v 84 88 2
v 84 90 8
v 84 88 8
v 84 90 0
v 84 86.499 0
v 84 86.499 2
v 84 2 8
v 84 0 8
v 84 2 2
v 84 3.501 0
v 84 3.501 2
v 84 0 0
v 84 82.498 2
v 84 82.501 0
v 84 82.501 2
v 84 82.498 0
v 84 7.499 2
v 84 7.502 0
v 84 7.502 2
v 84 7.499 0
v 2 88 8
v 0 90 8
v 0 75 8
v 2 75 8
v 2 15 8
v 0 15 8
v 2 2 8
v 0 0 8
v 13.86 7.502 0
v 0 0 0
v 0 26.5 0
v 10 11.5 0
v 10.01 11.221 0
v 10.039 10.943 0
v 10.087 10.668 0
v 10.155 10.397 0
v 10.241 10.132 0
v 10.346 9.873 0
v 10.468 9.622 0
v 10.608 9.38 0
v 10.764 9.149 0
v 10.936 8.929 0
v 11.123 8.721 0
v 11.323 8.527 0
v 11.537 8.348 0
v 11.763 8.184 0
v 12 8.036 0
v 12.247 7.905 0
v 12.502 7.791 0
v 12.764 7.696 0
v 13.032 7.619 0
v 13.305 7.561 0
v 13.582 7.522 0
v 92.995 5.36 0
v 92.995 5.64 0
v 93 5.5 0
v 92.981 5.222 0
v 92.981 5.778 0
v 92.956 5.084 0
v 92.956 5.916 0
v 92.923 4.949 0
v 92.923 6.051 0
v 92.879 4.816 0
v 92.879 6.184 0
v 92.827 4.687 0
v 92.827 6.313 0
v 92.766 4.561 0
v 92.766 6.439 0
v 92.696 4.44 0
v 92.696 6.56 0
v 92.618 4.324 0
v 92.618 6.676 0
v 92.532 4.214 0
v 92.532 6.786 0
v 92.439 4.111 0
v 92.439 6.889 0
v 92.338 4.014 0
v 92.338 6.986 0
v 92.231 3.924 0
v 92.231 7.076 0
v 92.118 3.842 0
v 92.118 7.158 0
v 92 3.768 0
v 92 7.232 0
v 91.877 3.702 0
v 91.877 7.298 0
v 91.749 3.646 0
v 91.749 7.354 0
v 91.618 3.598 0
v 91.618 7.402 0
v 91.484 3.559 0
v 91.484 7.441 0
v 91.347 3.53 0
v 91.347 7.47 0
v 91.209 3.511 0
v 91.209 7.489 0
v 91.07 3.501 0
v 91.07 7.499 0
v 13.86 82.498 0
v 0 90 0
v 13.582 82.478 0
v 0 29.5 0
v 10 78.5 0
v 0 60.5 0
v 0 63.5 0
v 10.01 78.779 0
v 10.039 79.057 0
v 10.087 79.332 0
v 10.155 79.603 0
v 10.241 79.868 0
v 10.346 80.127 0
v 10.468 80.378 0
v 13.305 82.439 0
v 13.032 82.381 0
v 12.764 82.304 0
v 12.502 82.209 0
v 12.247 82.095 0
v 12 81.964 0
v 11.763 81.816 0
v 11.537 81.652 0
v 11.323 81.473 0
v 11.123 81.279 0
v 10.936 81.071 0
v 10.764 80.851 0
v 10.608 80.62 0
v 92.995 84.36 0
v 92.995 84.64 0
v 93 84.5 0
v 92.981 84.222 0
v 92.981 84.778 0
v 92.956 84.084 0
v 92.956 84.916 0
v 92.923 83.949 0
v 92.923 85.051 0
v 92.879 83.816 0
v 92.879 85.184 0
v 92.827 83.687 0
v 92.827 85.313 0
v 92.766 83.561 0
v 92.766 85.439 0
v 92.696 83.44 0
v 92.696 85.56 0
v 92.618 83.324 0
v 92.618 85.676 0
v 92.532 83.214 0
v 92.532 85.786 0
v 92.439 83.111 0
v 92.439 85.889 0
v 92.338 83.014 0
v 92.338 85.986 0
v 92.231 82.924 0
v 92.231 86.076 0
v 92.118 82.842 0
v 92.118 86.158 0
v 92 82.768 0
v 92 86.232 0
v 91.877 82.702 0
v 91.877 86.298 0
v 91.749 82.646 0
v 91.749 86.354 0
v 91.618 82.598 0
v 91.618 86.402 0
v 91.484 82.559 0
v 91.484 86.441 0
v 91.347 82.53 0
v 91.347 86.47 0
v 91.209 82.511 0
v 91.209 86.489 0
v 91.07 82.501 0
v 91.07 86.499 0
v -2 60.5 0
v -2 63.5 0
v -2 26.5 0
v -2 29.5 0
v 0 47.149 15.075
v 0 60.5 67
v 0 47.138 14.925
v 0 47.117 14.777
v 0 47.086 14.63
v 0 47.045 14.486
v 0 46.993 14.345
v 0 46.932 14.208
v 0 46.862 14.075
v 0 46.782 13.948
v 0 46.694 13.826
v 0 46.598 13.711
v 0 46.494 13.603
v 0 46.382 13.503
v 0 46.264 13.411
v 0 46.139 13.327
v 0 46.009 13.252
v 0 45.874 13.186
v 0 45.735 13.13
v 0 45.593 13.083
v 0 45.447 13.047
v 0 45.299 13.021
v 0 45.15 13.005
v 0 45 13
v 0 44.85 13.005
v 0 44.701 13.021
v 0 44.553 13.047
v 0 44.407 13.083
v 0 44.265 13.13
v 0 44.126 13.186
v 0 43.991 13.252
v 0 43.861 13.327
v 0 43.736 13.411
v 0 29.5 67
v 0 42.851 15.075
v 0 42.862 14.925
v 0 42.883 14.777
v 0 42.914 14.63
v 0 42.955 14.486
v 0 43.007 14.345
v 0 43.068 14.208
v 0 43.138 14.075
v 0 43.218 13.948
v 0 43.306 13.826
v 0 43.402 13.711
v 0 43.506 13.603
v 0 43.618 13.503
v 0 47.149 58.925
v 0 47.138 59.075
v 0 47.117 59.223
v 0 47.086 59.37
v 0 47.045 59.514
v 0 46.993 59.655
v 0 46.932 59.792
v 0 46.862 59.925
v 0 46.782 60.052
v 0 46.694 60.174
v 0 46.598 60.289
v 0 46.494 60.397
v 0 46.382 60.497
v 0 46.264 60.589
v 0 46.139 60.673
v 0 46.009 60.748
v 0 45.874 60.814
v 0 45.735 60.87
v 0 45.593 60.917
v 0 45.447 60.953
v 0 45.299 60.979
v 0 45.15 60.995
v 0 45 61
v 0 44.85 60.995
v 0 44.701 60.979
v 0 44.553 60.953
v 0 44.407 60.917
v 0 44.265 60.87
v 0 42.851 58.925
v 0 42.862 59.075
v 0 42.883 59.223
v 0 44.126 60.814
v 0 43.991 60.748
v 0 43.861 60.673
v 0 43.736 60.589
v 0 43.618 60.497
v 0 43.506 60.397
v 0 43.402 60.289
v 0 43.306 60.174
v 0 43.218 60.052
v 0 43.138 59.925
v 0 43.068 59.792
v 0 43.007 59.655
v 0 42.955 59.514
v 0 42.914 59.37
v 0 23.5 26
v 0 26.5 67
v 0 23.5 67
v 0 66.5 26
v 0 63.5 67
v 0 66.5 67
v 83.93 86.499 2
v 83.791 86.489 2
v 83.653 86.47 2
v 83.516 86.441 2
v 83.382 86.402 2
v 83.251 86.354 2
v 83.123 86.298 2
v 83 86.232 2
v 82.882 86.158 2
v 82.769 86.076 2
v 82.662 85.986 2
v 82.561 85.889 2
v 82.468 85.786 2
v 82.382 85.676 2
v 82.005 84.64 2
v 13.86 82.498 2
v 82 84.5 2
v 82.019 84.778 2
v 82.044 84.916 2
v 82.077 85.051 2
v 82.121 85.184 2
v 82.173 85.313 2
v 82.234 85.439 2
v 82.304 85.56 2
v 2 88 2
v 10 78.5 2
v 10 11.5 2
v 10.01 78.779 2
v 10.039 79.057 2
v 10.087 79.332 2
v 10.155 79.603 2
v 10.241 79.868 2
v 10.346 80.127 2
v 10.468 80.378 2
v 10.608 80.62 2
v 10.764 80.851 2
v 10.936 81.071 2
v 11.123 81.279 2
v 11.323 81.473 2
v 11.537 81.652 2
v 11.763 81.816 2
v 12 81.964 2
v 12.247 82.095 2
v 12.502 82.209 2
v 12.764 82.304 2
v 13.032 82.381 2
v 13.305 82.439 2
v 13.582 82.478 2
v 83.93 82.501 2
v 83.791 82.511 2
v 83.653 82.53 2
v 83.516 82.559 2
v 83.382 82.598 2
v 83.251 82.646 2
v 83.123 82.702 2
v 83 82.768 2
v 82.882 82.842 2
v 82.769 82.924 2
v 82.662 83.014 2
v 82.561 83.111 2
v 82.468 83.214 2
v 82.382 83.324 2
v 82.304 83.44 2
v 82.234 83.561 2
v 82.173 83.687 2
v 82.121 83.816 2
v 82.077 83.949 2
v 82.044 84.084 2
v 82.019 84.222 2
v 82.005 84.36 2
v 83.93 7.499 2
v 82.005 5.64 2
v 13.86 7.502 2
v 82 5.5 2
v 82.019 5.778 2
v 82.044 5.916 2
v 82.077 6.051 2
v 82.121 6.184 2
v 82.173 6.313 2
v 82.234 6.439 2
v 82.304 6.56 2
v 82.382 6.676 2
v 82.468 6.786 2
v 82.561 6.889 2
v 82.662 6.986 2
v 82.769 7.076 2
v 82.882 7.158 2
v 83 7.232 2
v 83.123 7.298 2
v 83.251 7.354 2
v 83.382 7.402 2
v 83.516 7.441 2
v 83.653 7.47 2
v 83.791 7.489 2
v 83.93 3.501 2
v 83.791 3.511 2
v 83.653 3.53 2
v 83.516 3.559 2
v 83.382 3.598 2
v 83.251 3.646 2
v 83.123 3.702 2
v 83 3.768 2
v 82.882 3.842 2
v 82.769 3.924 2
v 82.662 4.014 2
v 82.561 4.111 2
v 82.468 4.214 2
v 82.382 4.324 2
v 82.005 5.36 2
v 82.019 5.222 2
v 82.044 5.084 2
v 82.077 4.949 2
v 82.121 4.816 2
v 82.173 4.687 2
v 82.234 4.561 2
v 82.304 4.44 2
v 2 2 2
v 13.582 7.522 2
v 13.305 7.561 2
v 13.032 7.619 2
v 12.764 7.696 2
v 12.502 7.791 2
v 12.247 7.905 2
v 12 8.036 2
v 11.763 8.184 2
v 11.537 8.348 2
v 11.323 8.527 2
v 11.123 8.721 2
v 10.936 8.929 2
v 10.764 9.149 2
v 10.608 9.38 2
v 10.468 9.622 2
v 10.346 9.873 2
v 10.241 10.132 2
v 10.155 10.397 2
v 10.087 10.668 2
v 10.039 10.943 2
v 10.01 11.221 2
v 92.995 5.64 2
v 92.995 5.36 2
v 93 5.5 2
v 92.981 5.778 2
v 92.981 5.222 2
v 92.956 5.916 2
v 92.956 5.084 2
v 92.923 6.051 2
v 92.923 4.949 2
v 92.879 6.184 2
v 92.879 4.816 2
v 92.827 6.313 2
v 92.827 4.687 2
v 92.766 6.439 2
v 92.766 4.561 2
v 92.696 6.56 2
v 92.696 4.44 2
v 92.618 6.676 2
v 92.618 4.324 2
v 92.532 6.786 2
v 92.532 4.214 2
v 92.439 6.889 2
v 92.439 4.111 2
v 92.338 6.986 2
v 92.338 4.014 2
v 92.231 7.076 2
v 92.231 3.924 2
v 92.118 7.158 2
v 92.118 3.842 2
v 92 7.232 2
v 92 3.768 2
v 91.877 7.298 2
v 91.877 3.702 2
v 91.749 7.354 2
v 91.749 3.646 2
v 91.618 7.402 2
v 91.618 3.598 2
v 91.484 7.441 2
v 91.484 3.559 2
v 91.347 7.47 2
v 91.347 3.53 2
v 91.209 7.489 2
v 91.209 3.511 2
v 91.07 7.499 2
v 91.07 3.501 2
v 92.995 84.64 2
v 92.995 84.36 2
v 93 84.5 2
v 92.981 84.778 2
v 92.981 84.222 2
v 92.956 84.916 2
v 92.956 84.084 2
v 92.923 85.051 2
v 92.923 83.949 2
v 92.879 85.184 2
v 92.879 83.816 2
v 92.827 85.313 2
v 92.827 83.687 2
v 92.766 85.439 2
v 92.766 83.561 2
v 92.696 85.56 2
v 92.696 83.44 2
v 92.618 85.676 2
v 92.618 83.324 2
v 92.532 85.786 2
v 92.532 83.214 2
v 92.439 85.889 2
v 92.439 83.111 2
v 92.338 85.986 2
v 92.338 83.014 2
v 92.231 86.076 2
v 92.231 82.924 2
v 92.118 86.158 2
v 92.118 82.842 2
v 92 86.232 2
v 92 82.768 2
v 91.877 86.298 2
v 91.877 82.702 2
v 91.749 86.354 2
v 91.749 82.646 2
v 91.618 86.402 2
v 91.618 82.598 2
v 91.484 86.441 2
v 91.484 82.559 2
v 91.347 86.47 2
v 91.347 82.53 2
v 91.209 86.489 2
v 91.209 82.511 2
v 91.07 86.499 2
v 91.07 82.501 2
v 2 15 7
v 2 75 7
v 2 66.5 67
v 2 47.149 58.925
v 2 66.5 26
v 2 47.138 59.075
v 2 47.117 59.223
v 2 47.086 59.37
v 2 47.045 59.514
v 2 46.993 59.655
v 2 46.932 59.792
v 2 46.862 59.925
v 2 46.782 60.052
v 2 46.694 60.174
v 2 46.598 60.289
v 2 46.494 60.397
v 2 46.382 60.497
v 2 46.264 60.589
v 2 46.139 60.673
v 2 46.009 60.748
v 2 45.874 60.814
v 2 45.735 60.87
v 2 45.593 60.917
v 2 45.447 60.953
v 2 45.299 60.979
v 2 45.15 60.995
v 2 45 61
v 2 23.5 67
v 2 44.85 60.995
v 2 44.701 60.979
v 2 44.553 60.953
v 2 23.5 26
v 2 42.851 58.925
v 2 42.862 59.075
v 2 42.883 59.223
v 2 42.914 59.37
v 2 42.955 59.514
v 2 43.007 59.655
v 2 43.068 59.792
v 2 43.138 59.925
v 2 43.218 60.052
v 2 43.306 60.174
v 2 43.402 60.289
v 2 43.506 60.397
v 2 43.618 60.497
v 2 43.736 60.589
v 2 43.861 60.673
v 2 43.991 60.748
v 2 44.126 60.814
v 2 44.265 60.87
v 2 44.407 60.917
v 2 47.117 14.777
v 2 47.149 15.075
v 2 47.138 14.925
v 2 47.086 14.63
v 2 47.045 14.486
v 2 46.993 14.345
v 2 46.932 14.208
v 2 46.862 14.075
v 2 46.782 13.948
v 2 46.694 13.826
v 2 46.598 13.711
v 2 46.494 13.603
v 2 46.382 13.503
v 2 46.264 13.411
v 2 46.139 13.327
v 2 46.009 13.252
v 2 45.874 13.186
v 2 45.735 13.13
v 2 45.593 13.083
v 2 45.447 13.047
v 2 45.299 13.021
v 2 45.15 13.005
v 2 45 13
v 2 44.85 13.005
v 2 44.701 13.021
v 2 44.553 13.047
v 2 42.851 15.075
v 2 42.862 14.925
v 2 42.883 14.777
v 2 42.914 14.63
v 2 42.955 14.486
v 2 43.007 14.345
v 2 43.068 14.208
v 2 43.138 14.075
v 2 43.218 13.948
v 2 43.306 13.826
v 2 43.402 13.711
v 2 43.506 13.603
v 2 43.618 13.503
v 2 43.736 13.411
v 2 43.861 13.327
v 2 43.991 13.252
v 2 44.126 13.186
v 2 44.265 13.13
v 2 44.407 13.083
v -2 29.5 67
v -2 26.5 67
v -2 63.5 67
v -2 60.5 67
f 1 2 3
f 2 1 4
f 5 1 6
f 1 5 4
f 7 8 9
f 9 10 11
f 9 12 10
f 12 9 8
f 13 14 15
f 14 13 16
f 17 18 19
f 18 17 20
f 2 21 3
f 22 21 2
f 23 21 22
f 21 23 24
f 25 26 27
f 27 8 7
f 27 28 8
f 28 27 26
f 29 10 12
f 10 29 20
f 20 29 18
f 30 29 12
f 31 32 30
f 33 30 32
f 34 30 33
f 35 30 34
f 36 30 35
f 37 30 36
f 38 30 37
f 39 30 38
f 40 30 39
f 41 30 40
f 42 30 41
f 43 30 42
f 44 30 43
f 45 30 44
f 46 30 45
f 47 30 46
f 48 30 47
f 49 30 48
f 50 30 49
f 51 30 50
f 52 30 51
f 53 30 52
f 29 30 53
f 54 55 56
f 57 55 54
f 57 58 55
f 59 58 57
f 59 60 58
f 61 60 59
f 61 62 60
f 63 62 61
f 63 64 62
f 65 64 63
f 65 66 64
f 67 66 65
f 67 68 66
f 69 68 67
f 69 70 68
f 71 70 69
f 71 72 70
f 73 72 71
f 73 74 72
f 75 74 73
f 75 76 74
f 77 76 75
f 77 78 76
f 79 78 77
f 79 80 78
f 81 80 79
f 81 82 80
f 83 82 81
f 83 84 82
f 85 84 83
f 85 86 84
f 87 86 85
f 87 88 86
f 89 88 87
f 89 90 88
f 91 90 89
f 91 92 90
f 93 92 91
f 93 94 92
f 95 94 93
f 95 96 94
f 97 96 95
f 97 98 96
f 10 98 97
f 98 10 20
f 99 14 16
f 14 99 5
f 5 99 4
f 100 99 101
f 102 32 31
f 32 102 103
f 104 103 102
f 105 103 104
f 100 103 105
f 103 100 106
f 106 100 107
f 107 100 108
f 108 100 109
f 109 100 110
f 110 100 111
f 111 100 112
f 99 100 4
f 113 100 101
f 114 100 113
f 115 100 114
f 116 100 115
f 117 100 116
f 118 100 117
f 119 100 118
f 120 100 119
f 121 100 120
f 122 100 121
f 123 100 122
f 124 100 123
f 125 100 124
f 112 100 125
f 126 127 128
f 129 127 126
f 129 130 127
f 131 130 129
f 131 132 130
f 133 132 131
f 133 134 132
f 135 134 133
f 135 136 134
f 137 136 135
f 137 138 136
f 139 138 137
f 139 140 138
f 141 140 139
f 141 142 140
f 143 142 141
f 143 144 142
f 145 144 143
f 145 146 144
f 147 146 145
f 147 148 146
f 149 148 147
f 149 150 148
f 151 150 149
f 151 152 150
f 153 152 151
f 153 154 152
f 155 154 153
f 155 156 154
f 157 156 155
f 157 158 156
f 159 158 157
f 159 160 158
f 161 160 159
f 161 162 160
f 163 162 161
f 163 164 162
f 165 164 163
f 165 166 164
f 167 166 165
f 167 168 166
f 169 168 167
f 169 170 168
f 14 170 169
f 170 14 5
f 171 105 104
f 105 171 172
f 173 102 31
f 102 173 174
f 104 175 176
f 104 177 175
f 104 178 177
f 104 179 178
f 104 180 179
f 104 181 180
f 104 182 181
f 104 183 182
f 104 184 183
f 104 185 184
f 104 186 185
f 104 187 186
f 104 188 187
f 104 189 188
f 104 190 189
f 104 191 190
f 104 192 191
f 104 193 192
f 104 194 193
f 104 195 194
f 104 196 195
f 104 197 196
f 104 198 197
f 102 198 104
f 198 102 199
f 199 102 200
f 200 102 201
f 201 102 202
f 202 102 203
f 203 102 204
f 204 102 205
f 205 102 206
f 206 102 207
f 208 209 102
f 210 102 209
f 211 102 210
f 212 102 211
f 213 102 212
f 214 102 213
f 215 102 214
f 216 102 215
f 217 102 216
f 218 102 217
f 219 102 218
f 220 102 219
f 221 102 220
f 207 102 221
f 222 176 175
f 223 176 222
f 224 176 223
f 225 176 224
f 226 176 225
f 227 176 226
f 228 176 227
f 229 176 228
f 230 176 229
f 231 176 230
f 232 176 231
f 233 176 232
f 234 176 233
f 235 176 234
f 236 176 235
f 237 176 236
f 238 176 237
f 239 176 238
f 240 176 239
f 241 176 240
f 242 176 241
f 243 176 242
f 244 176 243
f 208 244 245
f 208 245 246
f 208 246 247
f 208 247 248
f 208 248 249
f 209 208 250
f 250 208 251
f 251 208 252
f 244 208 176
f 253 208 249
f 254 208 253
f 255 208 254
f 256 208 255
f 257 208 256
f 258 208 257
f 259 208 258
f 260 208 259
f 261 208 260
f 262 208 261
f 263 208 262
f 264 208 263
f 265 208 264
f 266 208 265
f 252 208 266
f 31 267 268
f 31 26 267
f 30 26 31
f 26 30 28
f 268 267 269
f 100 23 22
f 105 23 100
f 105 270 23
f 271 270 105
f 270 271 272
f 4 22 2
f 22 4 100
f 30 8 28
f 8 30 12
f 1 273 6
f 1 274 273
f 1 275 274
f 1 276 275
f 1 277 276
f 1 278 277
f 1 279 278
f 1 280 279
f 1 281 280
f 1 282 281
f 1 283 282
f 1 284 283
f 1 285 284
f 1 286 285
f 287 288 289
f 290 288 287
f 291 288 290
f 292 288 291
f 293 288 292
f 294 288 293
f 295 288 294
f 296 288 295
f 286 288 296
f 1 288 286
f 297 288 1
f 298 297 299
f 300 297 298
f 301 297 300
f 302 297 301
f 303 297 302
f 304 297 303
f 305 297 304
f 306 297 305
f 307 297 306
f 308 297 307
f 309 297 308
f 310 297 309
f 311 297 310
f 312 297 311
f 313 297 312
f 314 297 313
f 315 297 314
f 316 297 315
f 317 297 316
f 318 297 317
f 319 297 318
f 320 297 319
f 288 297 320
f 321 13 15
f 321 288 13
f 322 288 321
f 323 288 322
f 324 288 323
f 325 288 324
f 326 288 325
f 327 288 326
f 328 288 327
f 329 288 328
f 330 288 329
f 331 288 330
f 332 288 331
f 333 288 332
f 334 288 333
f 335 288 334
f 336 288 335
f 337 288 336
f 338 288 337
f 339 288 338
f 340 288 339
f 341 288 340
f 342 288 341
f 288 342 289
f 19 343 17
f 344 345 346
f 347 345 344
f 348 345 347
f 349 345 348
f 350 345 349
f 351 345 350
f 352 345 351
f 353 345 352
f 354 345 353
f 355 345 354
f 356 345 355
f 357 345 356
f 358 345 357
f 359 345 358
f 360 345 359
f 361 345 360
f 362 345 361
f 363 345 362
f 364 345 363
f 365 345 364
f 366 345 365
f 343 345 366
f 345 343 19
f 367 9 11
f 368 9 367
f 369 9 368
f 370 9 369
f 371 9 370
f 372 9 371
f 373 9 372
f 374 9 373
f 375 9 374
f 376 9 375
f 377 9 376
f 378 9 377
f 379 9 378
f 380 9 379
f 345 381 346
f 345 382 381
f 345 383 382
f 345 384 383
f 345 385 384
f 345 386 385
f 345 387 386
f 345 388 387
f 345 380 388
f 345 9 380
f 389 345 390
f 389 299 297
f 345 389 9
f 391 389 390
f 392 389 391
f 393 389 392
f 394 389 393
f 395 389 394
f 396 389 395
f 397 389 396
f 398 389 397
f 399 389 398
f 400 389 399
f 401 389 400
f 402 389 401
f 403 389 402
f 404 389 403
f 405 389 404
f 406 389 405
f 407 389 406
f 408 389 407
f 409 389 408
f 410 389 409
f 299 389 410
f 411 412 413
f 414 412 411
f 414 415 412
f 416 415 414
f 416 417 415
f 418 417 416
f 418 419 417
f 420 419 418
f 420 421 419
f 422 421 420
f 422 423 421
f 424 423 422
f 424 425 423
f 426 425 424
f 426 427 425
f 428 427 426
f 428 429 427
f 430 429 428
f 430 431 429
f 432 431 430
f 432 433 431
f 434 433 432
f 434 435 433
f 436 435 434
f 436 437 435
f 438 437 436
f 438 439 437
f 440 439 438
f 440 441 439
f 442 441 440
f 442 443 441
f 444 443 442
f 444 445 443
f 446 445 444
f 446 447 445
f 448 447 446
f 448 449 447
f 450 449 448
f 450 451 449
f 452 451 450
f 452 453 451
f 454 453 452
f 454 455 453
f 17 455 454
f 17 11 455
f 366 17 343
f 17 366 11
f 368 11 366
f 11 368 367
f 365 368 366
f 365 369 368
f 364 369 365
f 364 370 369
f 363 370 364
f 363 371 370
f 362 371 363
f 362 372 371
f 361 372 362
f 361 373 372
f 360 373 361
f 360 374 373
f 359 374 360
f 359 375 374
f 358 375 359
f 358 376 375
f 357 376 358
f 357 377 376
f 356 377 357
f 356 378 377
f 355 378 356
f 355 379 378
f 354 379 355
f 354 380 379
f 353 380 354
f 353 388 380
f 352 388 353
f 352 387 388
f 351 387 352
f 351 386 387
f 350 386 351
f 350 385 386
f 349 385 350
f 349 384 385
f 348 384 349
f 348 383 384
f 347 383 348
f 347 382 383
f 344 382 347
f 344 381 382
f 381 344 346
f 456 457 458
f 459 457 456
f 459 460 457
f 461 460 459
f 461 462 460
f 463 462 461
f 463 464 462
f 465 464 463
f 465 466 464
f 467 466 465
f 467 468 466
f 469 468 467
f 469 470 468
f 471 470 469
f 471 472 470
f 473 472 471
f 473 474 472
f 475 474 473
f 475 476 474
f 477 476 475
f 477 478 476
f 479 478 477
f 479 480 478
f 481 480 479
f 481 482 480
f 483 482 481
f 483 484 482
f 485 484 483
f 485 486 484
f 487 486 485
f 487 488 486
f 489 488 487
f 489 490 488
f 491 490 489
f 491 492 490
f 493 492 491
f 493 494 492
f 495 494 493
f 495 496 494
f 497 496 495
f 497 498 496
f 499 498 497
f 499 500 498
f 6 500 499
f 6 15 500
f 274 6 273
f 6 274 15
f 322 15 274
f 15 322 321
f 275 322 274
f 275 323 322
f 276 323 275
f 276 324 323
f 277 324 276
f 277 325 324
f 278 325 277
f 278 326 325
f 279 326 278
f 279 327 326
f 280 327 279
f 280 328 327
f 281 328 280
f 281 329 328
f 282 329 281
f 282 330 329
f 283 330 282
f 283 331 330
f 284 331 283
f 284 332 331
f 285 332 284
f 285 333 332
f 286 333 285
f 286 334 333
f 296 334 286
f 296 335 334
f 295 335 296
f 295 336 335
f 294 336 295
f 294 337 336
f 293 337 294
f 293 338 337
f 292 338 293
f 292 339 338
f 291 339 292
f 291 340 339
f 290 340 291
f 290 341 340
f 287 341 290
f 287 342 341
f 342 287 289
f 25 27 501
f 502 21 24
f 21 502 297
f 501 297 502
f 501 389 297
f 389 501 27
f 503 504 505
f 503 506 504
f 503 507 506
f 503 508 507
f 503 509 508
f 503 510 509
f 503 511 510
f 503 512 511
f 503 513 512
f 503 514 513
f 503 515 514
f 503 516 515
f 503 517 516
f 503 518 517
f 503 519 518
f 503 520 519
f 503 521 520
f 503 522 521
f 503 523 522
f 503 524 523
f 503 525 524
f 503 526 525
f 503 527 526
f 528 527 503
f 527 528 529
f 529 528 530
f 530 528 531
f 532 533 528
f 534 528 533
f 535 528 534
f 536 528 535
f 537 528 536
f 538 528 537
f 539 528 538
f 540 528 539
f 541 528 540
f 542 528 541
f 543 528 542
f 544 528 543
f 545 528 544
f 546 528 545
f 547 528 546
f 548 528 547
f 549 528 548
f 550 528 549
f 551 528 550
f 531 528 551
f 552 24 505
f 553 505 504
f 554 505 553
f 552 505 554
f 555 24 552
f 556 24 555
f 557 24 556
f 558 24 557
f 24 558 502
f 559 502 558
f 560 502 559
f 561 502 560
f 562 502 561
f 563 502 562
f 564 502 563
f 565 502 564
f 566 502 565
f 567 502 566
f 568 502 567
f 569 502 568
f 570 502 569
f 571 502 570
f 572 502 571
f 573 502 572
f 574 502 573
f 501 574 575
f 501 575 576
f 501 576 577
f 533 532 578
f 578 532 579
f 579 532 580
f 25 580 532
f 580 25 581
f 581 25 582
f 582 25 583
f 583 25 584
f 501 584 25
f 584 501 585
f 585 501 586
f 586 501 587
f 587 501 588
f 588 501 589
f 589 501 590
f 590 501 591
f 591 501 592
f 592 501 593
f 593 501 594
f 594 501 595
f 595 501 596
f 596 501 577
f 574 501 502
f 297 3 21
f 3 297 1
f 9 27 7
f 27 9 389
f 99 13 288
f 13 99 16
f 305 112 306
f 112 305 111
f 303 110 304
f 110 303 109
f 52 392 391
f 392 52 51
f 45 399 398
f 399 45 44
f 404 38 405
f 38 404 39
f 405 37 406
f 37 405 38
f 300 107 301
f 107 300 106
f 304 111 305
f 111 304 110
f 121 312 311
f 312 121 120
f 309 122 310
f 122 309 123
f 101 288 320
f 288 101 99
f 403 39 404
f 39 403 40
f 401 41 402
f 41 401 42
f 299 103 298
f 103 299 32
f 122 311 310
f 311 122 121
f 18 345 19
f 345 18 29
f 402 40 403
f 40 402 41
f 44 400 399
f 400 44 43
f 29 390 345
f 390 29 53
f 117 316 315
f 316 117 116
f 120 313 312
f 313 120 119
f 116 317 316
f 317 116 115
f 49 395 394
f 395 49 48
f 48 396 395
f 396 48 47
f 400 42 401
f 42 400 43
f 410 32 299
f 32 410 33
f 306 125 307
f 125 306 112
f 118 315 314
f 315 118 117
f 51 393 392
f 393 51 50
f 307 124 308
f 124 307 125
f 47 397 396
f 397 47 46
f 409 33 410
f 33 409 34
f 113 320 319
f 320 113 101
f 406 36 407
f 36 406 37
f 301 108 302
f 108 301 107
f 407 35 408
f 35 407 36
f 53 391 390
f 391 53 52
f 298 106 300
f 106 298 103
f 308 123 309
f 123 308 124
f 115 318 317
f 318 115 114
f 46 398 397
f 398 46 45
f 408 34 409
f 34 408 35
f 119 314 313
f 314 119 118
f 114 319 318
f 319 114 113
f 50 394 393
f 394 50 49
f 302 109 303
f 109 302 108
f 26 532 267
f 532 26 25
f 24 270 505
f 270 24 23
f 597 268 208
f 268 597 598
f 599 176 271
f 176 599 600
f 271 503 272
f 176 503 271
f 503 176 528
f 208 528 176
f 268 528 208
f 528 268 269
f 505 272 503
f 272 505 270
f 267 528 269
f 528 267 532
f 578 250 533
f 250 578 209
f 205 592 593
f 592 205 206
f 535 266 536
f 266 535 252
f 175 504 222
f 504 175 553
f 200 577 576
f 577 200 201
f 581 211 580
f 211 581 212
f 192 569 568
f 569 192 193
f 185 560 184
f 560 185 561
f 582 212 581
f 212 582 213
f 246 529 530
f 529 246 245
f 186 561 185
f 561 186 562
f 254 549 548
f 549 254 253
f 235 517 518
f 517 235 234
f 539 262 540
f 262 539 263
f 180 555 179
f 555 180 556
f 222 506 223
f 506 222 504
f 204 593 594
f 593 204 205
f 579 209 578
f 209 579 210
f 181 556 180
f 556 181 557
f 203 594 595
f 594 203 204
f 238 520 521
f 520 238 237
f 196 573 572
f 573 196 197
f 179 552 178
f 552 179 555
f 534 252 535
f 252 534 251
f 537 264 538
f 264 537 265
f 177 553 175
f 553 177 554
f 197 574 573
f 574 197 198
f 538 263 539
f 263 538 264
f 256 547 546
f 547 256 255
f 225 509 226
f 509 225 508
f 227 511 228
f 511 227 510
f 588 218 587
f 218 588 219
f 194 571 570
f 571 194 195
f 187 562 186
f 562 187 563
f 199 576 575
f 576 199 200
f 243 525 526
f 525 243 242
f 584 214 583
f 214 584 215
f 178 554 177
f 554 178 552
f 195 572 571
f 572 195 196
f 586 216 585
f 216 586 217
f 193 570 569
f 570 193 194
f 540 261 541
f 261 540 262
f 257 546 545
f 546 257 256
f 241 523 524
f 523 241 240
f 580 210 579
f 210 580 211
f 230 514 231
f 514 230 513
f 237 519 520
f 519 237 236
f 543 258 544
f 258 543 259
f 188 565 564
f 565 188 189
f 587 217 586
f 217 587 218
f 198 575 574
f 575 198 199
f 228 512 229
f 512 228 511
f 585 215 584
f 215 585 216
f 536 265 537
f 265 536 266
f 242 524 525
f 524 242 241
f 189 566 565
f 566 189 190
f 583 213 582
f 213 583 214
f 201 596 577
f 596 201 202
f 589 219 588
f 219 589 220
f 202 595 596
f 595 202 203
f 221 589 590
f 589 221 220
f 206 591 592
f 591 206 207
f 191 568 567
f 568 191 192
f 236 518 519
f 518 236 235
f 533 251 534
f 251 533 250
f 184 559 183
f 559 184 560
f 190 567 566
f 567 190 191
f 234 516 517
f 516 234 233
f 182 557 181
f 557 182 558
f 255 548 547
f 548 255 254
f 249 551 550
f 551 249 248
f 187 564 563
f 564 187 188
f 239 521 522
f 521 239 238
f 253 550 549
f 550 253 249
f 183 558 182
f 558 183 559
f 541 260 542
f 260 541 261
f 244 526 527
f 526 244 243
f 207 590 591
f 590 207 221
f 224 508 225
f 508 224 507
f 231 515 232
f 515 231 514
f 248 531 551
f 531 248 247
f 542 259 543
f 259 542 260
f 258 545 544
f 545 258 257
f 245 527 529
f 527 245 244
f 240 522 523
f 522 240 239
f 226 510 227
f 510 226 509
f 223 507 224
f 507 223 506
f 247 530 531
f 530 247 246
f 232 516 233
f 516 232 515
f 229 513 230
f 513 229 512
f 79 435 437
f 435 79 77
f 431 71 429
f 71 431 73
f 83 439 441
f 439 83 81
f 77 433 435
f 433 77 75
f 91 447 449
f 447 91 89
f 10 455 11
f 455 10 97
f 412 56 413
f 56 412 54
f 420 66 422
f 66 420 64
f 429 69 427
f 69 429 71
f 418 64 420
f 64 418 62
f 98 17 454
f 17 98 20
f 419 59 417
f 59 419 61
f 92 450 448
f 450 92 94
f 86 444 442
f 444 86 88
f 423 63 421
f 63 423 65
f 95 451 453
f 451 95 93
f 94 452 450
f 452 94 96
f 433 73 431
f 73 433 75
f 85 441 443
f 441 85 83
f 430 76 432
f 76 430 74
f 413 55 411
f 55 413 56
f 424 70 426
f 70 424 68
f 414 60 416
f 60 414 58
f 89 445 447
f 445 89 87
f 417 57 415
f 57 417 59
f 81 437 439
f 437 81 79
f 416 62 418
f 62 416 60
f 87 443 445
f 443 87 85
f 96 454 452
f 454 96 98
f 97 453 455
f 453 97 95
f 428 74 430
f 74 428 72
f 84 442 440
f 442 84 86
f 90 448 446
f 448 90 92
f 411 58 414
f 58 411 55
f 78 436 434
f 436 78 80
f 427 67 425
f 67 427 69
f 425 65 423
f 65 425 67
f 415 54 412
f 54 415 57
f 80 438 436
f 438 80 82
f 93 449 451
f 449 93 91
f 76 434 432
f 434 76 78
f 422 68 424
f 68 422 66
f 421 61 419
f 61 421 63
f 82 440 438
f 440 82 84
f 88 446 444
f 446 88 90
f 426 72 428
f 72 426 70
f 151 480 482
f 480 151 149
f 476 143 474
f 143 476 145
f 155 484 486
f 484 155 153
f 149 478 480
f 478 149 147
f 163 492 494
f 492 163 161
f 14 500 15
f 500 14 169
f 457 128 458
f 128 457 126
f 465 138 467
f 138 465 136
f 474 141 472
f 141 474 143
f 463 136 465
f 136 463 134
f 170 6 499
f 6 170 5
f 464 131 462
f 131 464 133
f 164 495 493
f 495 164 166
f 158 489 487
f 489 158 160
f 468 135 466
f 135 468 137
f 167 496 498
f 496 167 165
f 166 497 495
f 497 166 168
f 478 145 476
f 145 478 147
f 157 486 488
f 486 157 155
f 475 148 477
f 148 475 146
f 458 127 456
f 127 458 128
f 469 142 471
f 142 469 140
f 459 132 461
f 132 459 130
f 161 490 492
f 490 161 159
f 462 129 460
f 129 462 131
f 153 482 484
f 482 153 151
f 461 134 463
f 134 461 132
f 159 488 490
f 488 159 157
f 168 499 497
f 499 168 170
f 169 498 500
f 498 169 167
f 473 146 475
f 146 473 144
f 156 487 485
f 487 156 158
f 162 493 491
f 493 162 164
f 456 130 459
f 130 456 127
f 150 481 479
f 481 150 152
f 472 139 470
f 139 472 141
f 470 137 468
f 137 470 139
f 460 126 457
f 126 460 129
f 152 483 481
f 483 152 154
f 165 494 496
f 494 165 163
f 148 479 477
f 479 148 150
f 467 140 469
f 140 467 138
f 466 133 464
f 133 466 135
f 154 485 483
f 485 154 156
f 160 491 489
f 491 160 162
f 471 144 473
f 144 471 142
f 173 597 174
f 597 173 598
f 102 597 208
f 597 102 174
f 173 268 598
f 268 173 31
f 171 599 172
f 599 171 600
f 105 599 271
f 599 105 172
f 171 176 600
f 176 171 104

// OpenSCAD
// file: round_corners.scad
module round_cube (x=40,y=30,z=2,d=10)
{
    assert(x >= d && y >= d, str("given diameter(d=",d,") exceed one of sides(x=",x,",y=",y,")! Use round_cube_lazy to automatically choose diameter."));
    
    A = x-d;
    B = y-d;
    C = z;
    
    translate([d/2,d/2,0])
    hull()
    {
        cylinder(d=d, h=C);
        translate([A,0,0]) cylinder(d=d, h=C);
        translate([A,B,0]) cylinder(d=d, h=C);
        translate([0,B,0]) cylinder(d=d, h=C);
    }   
}

//round_cube(x=5,y=10,d=20);

module round_cube_lazy(x=40,y=30,z=2,d=10)
{
    if (x<d || y<d)
    {
        echo("Avoiding dissaster by choosing new diameter.");
    }
    
    _d = min([x,y,d]);
    round_cube(x,y,z,_d);
}

round_cube_lazy(x=5,y=10,d=20);

$fn = 90;
module box (x=82,y=154,z=52,d=20,t=2)
{
    A = x-d;
    B = y-d;
    C = z;
    
    //%translate([-d/2,-d/2,0]) cube([x,y,z]);
    difference()
    {
        hull()
        {
            cylinder(d=d, h=C);
            translate([A,0,0]) cylinder(d=d, h=C);
            translate([A,B,0]) cylinder(d=d, h=C);
            translate([0,B,0]) cylinder(d=d, h=C);
        }
        
        translate([-t/2,-t/2,t])
        hull()
        {
            translate([t,t,0]) cylinder(d=d-t, h=C);
            translate([A,t,0]) cylinder(d=d-t, h=C);
            translate([A,B,0]) cylinder(d=d-t, h=C);
            translate([t,B,0]) cylinder(d=d-t, h=C);
        }
    }
}

//box();
// main file
use<round_corners.scad>;

// general parameters
$fn = 90;
eps = 0.01;
tol = 0.5;
t_tol = 0.1;

// box parameters
// main geometry parameters
b_x = 84;
b_y = 90;
b_z = 8;
// box bottom thickness
b_bt = 2;
// box wall thickness
b_wt = 2;

// bottom cut parameters
bc_x = b_x;
bc_xo = 10;
bc_y = 75;
bc_yo = 7.5;
bc_t = b_bt;
bc_d = 8;

// hooks parameters
h_l = 7;
h_d = 4;

// locker parameters
l_x = b_wt;
// additional locker extention for higher labware
l_extention = 25;
// lower y dimension
l_yl = 60;
l_yu = 43;
l_zu = 17+l_extention;
l_zl = 42-l_zu-b_z+l_extention;

// bolt hole
bh_d = 4.3;
bh_h = 23+l_extention;
bh_off = 13;

// support beams
sb_x = 2;
sb_y = 3;
sb_yo = 3;

module mag_holder()
{

    difference()
    {
        // main shape
        cube([b_x,b_y,b_z]);
        
        // upper cut
        translate([b_wt,b_wt,b_bt])
            cube([b_x,b_y-2*b_wt,b_z]);
        
        // lower cut
        translate([bc_xo,bc_yo,-eps])
            round_cube(x=bc_x,y=bc_y,z=b_bt+2*eps,d=bc_d);
    }
    
    // locker
    translate([0,(b_y-l_yl)/2,b_z])
    difference()
    {
        // locker main geometry
        union()
        {
            // lower part
            _l_yu_o = (l_yl-l_yu)/2;
            hull()
            {
                a = 1;
                translate([0,0,-a])
                    cube([l_x,l_yl,a]);
                translate([0,_l_yu_o,l_zl])
                    cube([l_x,l_yu,a]);
            }
            // upper part
            translate([0,_l_yu_o,l_zl])
                cube([l_x,l_yu,l_zu]);
            
        }
        
        // bolt hole
        translate([-eps,(l_yl)/2,bh_off-b_z+bh_d/2])
        hull()
        {
            rotate([0,90,0]) cylinder(d=bh_d,h=l_x+2*eps);
            translate([0,0,bh_h-bh_d]) rotate([0,90,0])
                cylinder(d=bh_d,h=l_x+2*eps);
        }
    }
    
    // hooks
    translate([b_x-h_d/2,bc_yo-h_d,0])
        round_cube(x=h_l+h_d,y=h_d,z=b_bt,d=h_d);
    translate([b_x-h_d/2,b_y-h_d-(bc_yo-h_d),0])
        round_cube(x=h_l+h_d,y=h_d,z=b_bt,d=h_d);
    
    // support beams
    translate([-sb_x,(b_y-l_yu)/2+sb_yo,0])
        cube([sb_x,sb_y,b_z+l_zu+l_zl]);
    translate([-sb_x,b_y -(b_y-l_yu)/2-sb_yo-sb_y,0])
        cube([sb_x,sb_y,b_z+l_zu+l_zl]);

}

mag_holder();
